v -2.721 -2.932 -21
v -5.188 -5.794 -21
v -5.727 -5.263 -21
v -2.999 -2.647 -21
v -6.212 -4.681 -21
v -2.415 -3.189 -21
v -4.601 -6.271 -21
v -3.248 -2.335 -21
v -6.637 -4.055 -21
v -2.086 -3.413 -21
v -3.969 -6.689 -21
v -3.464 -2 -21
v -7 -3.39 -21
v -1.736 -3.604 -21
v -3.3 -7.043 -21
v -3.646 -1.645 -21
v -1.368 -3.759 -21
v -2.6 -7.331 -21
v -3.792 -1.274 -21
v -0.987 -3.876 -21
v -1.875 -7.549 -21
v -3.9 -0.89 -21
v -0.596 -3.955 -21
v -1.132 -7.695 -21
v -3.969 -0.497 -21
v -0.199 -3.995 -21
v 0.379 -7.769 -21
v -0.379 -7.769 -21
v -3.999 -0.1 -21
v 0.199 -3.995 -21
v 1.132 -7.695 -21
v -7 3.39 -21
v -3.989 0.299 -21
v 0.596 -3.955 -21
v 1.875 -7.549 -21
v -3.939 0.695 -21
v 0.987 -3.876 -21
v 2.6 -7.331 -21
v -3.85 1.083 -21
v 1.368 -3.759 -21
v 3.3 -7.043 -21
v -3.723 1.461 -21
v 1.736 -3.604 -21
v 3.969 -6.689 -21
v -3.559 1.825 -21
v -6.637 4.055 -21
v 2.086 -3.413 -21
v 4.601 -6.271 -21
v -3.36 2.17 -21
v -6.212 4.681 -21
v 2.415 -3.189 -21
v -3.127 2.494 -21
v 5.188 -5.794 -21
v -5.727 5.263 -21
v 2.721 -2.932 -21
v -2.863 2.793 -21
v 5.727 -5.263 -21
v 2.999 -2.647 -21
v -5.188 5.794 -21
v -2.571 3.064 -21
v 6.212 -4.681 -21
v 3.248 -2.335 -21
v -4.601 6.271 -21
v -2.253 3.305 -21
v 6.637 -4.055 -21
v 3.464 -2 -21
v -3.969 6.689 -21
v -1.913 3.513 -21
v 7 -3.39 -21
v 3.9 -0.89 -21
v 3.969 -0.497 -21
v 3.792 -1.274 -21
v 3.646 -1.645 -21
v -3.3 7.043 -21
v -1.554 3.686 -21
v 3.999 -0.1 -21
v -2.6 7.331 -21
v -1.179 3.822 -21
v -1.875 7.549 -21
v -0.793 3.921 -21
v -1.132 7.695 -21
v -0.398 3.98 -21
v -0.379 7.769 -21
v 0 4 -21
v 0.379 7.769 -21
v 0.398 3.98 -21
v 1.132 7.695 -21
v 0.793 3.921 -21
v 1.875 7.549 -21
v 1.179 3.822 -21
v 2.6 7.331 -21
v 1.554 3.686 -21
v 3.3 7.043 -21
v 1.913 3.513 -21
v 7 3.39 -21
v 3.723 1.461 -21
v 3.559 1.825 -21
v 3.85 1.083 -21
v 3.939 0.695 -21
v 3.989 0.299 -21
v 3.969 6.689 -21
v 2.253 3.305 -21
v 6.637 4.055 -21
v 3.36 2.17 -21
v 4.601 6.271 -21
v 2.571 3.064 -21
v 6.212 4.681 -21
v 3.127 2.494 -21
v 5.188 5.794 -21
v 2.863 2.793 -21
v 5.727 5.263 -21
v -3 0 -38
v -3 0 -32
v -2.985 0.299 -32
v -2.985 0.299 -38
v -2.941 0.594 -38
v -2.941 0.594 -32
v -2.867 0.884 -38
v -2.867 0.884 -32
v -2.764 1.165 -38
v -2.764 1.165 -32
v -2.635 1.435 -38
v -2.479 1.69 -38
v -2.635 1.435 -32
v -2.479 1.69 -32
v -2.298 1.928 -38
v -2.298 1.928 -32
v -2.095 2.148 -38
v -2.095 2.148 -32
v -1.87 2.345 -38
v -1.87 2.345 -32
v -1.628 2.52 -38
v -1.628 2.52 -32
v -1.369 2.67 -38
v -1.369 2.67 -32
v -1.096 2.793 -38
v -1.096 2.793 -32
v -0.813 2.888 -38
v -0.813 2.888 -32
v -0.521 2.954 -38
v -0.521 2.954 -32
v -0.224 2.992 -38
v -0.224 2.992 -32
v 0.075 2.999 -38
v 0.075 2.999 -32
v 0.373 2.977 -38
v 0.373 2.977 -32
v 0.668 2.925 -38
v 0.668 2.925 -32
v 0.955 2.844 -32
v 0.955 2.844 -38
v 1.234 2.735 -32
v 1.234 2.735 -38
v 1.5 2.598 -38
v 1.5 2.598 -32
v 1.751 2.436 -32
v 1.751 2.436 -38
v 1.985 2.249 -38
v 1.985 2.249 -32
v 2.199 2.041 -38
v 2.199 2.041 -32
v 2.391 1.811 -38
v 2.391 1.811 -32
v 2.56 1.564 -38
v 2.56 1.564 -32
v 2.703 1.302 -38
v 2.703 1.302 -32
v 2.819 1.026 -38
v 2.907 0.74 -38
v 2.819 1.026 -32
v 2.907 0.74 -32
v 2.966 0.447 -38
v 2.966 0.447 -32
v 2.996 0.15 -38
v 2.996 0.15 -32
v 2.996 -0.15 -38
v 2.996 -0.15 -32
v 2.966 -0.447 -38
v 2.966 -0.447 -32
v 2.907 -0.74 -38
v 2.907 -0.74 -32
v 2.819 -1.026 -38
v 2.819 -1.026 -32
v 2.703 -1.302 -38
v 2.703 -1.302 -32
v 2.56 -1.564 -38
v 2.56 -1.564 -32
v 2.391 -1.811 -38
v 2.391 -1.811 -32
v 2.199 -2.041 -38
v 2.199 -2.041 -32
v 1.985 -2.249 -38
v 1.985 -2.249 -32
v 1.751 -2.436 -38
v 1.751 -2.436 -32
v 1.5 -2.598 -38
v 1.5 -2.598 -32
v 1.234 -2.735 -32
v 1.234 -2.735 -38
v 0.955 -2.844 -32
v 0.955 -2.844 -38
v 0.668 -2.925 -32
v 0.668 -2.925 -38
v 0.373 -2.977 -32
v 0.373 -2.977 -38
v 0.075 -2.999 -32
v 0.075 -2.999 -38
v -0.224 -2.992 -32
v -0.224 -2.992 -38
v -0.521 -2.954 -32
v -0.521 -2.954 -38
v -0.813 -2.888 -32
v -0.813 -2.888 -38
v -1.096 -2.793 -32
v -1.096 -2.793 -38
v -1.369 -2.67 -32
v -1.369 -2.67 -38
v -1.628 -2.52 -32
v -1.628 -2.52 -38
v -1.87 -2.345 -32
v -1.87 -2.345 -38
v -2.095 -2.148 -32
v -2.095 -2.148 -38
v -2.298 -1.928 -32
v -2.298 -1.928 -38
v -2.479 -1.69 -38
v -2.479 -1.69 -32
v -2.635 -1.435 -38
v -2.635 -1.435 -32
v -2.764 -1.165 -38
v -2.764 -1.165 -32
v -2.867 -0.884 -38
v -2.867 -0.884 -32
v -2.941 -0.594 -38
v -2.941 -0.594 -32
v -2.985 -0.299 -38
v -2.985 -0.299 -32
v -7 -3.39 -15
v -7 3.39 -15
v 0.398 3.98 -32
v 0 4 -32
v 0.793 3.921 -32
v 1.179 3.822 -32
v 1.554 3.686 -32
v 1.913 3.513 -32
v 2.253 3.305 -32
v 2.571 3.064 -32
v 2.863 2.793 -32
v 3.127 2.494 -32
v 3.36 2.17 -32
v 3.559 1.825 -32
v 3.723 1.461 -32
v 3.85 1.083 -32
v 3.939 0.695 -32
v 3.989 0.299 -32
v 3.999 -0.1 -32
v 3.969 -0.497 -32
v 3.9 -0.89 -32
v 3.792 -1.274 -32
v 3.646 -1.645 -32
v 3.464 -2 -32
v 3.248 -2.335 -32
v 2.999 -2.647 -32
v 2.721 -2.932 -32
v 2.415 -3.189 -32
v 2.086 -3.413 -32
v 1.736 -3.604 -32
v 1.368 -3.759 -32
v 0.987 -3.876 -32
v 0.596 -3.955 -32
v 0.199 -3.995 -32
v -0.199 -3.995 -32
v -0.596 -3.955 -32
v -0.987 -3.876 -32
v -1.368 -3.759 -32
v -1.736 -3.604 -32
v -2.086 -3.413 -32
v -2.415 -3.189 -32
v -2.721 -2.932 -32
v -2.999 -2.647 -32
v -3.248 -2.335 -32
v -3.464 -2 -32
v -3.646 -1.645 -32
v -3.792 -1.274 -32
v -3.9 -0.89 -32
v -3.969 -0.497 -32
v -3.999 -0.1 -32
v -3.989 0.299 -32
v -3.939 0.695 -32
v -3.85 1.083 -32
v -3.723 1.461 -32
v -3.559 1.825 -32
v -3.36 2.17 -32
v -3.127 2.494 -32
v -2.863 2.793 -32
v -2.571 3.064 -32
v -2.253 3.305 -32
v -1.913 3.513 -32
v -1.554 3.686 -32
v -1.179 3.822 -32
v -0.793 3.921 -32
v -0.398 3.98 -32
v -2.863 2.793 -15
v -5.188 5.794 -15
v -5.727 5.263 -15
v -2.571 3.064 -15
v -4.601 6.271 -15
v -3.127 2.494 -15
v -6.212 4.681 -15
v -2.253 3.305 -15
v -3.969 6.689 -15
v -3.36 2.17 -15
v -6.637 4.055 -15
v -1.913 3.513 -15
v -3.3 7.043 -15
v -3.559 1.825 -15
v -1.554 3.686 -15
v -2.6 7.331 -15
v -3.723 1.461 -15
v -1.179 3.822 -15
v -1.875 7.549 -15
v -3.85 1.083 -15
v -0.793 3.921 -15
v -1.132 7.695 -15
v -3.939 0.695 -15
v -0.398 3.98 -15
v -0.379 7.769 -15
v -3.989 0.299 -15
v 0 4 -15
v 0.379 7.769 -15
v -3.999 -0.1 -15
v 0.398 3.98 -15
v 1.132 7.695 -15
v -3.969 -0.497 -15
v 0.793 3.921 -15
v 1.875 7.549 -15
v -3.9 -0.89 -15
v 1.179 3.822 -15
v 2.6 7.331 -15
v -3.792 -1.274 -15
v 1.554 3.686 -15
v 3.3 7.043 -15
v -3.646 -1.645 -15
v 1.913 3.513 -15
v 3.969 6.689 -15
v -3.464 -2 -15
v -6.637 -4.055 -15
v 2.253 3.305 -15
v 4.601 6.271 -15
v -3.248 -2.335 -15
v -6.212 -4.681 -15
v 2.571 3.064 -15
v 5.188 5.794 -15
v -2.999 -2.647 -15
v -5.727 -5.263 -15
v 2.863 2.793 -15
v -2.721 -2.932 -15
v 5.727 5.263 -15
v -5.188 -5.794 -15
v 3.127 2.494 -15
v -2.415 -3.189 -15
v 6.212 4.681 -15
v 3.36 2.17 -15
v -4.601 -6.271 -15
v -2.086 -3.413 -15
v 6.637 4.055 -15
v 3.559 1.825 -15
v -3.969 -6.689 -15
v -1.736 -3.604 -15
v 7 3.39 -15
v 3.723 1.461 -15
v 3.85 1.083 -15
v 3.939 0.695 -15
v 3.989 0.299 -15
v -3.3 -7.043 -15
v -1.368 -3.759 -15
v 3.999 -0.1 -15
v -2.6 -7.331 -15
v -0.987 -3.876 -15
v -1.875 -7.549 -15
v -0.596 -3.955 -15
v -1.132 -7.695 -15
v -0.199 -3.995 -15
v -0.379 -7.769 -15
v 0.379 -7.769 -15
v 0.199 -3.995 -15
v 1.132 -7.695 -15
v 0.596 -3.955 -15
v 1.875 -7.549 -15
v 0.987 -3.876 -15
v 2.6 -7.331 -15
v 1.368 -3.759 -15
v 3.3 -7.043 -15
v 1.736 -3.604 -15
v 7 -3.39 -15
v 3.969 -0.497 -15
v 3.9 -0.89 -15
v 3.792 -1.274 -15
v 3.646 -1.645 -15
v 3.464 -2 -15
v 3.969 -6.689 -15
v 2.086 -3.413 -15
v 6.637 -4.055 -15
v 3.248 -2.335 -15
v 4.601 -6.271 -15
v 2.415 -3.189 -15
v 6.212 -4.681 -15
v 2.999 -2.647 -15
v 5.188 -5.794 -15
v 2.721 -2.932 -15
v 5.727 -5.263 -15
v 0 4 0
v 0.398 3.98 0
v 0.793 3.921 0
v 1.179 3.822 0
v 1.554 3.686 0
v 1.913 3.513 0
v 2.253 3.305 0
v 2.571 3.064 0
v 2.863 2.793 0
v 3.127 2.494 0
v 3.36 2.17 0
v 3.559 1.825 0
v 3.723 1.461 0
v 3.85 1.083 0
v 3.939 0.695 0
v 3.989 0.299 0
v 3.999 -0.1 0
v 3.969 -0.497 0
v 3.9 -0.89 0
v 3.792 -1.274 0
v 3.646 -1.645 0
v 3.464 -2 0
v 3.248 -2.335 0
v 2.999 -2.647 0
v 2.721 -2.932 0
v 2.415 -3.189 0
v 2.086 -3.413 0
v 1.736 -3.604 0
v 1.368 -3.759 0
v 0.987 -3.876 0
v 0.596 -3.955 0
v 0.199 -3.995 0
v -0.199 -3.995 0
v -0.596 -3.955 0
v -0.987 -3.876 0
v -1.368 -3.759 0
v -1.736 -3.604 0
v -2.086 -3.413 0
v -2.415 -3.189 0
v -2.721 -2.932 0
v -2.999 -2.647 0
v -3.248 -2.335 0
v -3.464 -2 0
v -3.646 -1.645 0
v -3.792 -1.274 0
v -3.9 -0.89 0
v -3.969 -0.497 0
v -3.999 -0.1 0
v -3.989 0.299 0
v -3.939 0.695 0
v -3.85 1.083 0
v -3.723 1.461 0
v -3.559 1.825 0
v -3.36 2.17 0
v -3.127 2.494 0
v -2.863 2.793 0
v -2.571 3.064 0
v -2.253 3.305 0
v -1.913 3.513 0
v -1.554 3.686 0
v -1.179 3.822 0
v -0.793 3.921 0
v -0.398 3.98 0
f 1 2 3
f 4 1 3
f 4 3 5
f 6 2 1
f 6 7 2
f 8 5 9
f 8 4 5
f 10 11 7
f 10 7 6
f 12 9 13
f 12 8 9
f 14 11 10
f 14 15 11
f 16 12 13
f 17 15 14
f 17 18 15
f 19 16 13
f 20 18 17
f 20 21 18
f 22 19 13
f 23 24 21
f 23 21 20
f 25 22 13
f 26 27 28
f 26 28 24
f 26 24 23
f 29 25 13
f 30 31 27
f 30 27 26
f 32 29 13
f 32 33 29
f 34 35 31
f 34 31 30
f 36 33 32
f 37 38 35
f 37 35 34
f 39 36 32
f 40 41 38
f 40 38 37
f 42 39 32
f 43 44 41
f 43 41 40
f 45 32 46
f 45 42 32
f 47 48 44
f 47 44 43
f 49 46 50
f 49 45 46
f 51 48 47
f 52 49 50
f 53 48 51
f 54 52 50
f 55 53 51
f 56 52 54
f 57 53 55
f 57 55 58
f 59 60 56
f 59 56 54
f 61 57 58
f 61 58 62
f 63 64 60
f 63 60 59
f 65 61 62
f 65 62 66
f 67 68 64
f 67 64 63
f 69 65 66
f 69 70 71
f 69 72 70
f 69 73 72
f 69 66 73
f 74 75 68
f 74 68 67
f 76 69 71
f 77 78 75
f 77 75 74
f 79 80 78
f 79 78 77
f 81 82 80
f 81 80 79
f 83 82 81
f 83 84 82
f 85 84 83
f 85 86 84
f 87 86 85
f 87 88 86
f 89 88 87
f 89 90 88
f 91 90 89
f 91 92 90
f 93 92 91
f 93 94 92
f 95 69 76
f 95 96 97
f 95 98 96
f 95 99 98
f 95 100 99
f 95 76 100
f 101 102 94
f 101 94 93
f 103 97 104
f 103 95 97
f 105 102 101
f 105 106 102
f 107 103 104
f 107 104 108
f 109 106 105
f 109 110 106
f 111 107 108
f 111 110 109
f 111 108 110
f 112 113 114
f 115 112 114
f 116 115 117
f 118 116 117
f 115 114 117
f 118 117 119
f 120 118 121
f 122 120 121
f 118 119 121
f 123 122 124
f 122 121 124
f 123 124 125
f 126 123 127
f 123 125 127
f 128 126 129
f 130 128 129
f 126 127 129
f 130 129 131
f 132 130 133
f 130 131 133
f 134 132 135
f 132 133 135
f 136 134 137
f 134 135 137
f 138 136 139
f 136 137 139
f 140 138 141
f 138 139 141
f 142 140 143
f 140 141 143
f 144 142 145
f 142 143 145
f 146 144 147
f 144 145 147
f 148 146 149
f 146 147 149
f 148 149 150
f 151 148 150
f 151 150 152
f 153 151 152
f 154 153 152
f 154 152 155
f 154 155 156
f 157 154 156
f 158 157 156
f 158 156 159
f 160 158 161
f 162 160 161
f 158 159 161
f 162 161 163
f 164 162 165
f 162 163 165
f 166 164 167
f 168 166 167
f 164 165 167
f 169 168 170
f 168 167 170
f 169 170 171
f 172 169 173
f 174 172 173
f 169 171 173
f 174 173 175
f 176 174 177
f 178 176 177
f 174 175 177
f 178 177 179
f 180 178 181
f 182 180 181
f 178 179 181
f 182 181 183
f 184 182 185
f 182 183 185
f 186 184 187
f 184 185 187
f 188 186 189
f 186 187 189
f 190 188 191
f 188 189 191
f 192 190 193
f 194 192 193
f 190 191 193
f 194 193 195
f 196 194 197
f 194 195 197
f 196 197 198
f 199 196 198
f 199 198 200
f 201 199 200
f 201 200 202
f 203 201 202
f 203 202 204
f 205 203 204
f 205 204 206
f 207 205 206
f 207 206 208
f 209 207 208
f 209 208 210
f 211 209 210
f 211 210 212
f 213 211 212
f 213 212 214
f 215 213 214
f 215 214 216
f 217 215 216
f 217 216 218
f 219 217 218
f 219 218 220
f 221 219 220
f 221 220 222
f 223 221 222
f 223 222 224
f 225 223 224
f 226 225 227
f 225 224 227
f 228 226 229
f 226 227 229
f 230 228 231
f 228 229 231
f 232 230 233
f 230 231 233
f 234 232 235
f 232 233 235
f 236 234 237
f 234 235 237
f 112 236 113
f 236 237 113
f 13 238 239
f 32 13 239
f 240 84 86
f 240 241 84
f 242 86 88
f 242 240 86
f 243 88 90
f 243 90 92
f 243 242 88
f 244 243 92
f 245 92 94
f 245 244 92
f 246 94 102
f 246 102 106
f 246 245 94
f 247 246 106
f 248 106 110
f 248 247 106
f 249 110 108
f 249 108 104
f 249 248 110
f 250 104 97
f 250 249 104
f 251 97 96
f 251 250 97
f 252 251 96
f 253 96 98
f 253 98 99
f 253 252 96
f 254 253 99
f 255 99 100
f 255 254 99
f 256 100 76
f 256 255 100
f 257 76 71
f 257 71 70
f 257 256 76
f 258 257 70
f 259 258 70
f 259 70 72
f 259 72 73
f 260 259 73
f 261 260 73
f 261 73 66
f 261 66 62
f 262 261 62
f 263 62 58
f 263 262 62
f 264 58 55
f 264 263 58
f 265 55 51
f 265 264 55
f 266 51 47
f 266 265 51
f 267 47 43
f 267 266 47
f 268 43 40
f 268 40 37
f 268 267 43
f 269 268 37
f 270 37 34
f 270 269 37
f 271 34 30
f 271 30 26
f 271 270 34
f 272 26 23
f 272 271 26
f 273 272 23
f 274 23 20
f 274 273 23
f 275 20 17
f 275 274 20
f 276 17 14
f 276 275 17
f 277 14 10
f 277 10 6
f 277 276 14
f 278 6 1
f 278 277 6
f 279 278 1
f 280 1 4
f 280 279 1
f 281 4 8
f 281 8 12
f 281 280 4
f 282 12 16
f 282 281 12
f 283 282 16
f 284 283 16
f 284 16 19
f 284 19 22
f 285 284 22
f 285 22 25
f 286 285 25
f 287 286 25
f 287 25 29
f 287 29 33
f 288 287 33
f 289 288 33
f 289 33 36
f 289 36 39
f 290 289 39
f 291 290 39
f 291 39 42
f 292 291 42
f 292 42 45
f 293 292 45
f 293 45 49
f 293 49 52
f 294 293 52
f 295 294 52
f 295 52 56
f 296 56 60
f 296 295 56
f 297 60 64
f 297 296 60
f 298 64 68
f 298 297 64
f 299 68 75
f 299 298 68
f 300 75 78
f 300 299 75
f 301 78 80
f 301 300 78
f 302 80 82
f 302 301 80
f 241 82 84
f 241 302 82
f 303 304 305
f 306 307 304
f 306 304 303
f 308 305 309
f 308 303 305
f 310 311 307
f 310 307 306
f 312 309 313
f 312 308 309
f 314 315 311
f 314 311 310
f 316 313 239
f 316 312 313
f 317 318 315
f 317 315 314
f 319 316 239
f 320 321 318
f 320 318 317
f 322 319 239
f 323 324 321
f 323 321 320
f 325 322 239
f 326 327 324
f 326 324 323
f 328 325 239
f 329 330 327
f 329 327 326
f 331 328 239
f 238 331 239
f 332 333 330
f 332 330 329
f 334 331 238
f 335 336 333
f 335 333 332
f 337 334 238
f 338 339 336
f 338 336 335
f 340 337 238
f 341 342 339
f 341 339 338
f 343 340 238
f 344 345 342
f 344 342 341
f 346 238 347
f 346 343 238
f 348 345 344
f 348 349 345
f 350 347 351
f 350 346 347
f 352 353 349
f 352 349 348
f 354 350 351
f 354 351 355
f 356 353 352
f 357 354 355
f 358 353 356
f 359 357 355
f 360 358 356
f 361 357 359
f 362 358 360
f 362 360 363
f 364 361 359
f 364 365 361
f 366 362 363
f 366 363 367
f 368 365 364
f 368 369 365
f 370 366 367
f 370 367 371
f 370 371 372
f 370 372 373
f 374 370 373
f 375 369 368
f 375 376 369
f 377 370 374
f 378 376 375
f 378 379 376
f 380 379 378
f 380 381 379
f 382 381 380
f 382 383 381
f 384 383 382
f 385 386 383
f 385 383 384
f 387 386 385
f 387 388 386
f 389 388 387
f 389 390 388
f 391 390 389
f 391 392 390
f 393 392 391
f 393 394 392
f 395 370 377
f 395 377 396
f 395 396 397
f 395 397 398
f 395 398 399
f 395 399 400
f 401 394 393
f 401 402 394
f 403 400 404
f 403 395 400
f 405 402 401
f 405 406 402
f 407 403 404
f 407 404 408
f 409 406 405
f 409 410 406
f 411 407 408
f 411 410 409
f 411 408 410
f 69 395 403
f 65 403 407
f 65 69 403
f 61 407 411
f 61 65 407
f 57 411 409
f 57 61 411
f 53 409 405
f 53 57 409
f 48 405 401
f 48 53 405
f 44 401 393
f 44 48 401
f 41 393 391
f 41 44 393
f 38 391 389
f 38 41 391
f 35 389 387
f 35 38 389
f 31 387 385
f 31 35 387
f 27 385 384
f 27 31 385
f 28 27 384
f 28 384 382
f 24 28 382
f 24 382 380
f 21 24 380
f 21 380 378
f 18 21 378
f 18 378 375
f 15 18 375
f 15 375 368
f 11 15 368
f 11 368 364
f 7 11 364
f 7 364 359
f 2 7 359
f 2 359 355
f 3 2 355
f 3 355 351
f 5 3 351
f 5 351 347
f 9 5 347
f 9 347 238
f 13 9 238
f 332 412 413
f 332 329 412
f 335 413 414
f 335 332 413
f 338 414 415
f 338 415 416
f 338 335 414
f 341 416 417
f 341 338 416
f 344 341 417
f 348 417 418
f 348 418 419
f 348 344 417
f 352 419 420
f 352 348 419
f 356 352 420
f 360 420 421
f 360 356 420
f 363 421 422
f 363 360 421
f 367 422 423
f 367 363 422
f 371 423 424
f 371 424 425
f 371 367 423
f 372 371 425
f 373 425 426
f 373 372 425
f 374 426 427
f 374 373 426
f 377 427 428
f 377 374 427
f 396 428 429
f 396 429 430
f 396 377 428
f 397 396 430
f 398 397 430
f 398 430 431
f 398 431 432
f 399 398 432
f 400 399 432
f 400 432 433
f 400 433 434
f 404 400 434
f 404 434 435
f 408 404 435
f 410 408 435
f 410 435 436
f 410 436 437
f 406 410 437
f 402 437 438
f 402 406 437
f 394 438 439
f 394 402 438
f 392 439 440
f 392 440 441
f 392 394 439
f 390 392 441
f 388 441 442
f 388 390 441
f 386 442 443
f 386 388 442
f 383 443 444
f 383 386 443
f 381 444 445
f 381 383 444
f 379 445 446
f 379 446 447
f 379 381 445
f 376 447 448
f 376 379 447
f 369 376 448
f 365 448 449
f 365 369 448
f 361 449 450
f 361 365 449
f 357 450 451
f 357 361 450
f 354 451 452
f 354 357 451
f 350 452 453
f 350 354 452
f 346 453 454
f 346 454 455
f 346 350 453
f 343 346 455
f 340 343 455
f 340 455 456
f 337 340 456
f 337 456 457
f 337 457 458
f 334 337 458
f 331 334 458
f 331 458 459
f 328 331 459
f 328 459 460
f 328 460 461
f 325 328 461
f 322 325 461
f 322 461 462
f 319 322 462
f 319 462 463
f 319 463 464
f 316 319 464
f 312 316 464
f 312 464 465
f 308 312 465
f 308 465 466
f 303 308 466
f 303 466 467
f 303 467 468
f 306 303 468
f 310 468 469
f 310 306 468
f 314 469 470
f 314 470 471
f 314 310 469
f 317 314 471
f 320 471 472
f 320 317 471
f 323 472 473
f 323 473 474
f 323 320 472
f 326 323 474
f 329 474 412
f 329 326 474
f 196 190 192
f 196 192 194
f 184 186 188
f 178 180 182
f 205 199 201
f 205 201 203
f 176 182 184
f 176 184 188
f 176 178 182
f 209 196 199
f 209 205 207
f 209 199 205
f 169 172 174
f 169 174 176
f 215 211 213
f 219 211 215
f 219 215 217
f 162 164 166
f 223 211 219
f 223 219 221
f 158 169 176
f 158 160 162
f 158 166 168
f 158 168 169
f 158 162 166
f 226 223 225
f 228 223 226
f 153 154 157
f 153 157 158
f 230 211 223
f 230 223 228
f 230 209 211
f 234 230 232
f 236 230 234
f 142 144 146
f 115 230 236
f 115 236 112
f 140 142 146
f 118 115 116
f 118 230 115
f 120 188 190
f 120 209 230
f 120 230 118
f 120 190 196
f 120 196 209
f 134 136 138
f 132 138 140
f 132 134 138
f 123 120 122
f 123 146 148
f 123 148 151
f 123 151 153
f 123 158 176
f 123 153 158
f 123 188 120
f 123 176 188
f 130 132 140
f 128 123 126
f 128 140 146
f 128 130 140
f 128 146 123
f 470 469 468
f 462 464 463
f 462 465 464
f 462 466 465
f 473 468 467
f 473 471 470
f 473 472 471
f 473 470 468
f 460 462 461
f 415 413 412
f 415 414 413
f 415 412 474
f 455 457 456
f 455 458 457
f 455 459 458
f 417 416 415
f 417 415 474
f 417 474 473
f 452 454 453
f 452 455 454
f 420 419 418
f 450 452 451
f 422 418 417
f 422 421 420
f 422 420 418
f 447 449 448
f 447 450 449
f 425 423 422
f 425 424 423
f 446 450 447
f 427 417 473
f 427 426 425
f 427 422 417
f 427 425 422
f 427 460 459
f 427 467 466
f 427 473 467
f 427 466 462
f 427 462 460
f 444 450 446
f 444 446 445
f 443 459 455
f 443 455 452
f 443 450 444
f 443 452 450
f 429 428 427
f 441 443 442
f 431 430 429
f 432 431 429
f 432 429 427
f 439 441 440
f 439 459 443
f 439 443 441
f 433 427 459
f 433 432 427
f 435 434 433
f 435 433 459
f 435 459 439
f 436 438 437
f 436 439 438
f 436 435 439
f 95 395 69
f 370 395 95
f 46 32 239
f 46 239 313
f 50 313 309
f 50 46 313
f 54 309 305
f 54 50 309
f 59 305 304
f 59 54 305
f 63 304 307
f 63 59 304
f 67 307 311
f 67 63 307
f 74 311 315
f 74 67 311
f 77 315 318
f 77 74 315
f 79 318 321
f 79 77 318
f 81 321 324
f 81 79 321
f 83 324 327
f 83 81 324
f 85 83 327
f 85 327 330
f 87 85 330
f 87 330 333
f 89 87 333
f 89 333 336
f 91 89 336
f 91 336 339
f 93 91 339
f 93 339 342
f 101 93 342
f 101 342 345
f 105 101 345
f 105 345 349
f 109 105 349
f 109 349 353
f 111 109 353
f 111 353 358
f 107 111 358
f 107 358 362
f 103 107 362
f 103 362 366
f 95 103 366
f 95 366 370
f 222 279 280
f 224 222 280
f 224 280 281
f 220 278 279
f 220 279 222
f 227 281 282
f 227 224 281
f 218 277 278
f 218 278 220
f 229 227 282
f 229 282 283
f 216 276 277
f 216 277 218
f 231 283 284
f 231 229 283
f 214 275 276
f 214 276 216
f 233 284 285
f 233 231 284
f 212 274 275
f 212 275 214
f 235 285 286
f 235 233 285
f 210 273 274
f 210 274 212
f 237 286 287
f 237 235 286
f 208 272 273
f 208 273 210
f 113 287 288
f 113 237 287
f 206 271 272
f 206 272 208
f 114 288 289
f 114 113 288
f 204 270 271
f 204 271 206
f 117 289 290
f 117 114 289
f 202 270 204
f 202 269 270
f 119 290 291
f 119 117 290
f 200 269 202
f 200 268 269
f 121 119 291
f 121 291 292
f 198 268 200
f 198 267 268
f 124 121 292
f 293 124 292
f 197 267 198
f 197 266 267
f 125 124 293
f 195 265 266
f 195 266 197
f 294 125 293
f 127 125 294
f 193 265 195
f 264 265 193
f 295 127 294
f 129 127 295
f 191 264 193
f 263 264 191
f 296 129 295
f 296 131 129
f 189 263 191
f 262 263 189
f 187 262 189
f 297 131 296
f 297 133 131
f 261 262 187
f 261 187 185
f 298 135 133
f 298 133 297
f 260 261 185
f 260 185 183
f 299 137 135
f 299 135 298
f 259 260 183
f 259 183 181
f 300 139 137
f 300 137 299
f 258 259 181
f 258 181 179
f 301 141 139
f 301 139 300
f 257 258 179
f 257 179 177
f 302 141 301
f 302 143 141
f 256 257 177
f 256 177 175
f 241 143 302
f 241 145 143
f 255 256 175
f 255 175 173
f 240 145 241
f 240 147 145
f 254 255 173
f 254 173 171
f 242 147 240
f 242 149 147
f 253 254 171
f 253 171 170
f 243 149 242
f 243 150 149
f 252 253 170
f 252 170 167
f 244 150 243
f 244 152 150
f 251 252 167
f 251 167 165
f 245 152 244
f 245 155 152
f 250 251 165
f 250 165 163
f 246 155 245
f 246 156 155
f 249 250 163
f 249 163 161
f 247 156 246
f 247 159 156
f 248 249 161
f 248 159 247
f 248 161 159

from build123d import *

# Parameters (mm, degrees)
SKETCH_3_W          = 8
SKETCH_3_H          = 16.823898374
CUT_EXTRUDE_1_DEPTH = 10
SKETCH_5_OUTSIDE_W  = 23.858
SKETCH_5_OUTSIDE_H  = 27.858
SKETCH_5_OUTSIDE_R  = 7.77784742
CUT_EXTRUDE_2_DEPTH = 10
SKETCH_6_R          = 3
EXTRUDE_1_DEPTH     = 6


with BuildPart() as part:
    # 草图2 → 旋转1 (revolve)
    with BuildSketch(Plane(origin=(0, 0, 0), x_dir=(0, 0, -1), z_dir=(1, 0, 0))):
        Polygon((0, 0), (0, 4), (15, 4), (15, 9), (21, 9), (21, 4), (32, 4), (32, 0), align=None)
    revolve(axis=Axis((0, 0, 0), (0, 0, -1)))

    # 草图3 → 切除-拉伸1 (cut)
    with BuildSketch(Plane.XY.offset(-15)):
        with Locations((-11, -0.026043186)):
            Rectangle(SKETCH_3_W, SKETCH_3_H)
        with Locations((11, -0.026043186)):
            Rectangle(SKETCH_3_W, SKETCH_3_H)
    extrude(amount=-CUT_EXTRUDE_1_DEPTH, mode=Mode.SUBTRACT)

    # 草图5 outside → 切除-拉伸2 (cut)
    with BuildSketch(Plane(origin=(0, 0, -21), x_dir=(-1, 0, 0), z_dir=(0, 0, -1))):
        Rectangle(SKETCH_5_OUTSIDE_W, SKETCH_5_OUTSIDE_H)
        Circle(SKETCH_5_OUTSIDE_R, mode=Mode.SUBTRACT)
    extrude(amount=-CUT_EXTRUDE_2_DEPTH, mode=Mode.SUBTRACT)

    # 草图6 → 凸台-拉伸1 (add)
    with BuildSketch(Plane(origin=(0, 0, -32), x_dir=(-1, 0, 0), z_dir=(0, 0, -1))):
        Circle(SKETCH_6_R)
    extrude(amount=EXTRUDE_1_DEPTH)


solid = part.part
